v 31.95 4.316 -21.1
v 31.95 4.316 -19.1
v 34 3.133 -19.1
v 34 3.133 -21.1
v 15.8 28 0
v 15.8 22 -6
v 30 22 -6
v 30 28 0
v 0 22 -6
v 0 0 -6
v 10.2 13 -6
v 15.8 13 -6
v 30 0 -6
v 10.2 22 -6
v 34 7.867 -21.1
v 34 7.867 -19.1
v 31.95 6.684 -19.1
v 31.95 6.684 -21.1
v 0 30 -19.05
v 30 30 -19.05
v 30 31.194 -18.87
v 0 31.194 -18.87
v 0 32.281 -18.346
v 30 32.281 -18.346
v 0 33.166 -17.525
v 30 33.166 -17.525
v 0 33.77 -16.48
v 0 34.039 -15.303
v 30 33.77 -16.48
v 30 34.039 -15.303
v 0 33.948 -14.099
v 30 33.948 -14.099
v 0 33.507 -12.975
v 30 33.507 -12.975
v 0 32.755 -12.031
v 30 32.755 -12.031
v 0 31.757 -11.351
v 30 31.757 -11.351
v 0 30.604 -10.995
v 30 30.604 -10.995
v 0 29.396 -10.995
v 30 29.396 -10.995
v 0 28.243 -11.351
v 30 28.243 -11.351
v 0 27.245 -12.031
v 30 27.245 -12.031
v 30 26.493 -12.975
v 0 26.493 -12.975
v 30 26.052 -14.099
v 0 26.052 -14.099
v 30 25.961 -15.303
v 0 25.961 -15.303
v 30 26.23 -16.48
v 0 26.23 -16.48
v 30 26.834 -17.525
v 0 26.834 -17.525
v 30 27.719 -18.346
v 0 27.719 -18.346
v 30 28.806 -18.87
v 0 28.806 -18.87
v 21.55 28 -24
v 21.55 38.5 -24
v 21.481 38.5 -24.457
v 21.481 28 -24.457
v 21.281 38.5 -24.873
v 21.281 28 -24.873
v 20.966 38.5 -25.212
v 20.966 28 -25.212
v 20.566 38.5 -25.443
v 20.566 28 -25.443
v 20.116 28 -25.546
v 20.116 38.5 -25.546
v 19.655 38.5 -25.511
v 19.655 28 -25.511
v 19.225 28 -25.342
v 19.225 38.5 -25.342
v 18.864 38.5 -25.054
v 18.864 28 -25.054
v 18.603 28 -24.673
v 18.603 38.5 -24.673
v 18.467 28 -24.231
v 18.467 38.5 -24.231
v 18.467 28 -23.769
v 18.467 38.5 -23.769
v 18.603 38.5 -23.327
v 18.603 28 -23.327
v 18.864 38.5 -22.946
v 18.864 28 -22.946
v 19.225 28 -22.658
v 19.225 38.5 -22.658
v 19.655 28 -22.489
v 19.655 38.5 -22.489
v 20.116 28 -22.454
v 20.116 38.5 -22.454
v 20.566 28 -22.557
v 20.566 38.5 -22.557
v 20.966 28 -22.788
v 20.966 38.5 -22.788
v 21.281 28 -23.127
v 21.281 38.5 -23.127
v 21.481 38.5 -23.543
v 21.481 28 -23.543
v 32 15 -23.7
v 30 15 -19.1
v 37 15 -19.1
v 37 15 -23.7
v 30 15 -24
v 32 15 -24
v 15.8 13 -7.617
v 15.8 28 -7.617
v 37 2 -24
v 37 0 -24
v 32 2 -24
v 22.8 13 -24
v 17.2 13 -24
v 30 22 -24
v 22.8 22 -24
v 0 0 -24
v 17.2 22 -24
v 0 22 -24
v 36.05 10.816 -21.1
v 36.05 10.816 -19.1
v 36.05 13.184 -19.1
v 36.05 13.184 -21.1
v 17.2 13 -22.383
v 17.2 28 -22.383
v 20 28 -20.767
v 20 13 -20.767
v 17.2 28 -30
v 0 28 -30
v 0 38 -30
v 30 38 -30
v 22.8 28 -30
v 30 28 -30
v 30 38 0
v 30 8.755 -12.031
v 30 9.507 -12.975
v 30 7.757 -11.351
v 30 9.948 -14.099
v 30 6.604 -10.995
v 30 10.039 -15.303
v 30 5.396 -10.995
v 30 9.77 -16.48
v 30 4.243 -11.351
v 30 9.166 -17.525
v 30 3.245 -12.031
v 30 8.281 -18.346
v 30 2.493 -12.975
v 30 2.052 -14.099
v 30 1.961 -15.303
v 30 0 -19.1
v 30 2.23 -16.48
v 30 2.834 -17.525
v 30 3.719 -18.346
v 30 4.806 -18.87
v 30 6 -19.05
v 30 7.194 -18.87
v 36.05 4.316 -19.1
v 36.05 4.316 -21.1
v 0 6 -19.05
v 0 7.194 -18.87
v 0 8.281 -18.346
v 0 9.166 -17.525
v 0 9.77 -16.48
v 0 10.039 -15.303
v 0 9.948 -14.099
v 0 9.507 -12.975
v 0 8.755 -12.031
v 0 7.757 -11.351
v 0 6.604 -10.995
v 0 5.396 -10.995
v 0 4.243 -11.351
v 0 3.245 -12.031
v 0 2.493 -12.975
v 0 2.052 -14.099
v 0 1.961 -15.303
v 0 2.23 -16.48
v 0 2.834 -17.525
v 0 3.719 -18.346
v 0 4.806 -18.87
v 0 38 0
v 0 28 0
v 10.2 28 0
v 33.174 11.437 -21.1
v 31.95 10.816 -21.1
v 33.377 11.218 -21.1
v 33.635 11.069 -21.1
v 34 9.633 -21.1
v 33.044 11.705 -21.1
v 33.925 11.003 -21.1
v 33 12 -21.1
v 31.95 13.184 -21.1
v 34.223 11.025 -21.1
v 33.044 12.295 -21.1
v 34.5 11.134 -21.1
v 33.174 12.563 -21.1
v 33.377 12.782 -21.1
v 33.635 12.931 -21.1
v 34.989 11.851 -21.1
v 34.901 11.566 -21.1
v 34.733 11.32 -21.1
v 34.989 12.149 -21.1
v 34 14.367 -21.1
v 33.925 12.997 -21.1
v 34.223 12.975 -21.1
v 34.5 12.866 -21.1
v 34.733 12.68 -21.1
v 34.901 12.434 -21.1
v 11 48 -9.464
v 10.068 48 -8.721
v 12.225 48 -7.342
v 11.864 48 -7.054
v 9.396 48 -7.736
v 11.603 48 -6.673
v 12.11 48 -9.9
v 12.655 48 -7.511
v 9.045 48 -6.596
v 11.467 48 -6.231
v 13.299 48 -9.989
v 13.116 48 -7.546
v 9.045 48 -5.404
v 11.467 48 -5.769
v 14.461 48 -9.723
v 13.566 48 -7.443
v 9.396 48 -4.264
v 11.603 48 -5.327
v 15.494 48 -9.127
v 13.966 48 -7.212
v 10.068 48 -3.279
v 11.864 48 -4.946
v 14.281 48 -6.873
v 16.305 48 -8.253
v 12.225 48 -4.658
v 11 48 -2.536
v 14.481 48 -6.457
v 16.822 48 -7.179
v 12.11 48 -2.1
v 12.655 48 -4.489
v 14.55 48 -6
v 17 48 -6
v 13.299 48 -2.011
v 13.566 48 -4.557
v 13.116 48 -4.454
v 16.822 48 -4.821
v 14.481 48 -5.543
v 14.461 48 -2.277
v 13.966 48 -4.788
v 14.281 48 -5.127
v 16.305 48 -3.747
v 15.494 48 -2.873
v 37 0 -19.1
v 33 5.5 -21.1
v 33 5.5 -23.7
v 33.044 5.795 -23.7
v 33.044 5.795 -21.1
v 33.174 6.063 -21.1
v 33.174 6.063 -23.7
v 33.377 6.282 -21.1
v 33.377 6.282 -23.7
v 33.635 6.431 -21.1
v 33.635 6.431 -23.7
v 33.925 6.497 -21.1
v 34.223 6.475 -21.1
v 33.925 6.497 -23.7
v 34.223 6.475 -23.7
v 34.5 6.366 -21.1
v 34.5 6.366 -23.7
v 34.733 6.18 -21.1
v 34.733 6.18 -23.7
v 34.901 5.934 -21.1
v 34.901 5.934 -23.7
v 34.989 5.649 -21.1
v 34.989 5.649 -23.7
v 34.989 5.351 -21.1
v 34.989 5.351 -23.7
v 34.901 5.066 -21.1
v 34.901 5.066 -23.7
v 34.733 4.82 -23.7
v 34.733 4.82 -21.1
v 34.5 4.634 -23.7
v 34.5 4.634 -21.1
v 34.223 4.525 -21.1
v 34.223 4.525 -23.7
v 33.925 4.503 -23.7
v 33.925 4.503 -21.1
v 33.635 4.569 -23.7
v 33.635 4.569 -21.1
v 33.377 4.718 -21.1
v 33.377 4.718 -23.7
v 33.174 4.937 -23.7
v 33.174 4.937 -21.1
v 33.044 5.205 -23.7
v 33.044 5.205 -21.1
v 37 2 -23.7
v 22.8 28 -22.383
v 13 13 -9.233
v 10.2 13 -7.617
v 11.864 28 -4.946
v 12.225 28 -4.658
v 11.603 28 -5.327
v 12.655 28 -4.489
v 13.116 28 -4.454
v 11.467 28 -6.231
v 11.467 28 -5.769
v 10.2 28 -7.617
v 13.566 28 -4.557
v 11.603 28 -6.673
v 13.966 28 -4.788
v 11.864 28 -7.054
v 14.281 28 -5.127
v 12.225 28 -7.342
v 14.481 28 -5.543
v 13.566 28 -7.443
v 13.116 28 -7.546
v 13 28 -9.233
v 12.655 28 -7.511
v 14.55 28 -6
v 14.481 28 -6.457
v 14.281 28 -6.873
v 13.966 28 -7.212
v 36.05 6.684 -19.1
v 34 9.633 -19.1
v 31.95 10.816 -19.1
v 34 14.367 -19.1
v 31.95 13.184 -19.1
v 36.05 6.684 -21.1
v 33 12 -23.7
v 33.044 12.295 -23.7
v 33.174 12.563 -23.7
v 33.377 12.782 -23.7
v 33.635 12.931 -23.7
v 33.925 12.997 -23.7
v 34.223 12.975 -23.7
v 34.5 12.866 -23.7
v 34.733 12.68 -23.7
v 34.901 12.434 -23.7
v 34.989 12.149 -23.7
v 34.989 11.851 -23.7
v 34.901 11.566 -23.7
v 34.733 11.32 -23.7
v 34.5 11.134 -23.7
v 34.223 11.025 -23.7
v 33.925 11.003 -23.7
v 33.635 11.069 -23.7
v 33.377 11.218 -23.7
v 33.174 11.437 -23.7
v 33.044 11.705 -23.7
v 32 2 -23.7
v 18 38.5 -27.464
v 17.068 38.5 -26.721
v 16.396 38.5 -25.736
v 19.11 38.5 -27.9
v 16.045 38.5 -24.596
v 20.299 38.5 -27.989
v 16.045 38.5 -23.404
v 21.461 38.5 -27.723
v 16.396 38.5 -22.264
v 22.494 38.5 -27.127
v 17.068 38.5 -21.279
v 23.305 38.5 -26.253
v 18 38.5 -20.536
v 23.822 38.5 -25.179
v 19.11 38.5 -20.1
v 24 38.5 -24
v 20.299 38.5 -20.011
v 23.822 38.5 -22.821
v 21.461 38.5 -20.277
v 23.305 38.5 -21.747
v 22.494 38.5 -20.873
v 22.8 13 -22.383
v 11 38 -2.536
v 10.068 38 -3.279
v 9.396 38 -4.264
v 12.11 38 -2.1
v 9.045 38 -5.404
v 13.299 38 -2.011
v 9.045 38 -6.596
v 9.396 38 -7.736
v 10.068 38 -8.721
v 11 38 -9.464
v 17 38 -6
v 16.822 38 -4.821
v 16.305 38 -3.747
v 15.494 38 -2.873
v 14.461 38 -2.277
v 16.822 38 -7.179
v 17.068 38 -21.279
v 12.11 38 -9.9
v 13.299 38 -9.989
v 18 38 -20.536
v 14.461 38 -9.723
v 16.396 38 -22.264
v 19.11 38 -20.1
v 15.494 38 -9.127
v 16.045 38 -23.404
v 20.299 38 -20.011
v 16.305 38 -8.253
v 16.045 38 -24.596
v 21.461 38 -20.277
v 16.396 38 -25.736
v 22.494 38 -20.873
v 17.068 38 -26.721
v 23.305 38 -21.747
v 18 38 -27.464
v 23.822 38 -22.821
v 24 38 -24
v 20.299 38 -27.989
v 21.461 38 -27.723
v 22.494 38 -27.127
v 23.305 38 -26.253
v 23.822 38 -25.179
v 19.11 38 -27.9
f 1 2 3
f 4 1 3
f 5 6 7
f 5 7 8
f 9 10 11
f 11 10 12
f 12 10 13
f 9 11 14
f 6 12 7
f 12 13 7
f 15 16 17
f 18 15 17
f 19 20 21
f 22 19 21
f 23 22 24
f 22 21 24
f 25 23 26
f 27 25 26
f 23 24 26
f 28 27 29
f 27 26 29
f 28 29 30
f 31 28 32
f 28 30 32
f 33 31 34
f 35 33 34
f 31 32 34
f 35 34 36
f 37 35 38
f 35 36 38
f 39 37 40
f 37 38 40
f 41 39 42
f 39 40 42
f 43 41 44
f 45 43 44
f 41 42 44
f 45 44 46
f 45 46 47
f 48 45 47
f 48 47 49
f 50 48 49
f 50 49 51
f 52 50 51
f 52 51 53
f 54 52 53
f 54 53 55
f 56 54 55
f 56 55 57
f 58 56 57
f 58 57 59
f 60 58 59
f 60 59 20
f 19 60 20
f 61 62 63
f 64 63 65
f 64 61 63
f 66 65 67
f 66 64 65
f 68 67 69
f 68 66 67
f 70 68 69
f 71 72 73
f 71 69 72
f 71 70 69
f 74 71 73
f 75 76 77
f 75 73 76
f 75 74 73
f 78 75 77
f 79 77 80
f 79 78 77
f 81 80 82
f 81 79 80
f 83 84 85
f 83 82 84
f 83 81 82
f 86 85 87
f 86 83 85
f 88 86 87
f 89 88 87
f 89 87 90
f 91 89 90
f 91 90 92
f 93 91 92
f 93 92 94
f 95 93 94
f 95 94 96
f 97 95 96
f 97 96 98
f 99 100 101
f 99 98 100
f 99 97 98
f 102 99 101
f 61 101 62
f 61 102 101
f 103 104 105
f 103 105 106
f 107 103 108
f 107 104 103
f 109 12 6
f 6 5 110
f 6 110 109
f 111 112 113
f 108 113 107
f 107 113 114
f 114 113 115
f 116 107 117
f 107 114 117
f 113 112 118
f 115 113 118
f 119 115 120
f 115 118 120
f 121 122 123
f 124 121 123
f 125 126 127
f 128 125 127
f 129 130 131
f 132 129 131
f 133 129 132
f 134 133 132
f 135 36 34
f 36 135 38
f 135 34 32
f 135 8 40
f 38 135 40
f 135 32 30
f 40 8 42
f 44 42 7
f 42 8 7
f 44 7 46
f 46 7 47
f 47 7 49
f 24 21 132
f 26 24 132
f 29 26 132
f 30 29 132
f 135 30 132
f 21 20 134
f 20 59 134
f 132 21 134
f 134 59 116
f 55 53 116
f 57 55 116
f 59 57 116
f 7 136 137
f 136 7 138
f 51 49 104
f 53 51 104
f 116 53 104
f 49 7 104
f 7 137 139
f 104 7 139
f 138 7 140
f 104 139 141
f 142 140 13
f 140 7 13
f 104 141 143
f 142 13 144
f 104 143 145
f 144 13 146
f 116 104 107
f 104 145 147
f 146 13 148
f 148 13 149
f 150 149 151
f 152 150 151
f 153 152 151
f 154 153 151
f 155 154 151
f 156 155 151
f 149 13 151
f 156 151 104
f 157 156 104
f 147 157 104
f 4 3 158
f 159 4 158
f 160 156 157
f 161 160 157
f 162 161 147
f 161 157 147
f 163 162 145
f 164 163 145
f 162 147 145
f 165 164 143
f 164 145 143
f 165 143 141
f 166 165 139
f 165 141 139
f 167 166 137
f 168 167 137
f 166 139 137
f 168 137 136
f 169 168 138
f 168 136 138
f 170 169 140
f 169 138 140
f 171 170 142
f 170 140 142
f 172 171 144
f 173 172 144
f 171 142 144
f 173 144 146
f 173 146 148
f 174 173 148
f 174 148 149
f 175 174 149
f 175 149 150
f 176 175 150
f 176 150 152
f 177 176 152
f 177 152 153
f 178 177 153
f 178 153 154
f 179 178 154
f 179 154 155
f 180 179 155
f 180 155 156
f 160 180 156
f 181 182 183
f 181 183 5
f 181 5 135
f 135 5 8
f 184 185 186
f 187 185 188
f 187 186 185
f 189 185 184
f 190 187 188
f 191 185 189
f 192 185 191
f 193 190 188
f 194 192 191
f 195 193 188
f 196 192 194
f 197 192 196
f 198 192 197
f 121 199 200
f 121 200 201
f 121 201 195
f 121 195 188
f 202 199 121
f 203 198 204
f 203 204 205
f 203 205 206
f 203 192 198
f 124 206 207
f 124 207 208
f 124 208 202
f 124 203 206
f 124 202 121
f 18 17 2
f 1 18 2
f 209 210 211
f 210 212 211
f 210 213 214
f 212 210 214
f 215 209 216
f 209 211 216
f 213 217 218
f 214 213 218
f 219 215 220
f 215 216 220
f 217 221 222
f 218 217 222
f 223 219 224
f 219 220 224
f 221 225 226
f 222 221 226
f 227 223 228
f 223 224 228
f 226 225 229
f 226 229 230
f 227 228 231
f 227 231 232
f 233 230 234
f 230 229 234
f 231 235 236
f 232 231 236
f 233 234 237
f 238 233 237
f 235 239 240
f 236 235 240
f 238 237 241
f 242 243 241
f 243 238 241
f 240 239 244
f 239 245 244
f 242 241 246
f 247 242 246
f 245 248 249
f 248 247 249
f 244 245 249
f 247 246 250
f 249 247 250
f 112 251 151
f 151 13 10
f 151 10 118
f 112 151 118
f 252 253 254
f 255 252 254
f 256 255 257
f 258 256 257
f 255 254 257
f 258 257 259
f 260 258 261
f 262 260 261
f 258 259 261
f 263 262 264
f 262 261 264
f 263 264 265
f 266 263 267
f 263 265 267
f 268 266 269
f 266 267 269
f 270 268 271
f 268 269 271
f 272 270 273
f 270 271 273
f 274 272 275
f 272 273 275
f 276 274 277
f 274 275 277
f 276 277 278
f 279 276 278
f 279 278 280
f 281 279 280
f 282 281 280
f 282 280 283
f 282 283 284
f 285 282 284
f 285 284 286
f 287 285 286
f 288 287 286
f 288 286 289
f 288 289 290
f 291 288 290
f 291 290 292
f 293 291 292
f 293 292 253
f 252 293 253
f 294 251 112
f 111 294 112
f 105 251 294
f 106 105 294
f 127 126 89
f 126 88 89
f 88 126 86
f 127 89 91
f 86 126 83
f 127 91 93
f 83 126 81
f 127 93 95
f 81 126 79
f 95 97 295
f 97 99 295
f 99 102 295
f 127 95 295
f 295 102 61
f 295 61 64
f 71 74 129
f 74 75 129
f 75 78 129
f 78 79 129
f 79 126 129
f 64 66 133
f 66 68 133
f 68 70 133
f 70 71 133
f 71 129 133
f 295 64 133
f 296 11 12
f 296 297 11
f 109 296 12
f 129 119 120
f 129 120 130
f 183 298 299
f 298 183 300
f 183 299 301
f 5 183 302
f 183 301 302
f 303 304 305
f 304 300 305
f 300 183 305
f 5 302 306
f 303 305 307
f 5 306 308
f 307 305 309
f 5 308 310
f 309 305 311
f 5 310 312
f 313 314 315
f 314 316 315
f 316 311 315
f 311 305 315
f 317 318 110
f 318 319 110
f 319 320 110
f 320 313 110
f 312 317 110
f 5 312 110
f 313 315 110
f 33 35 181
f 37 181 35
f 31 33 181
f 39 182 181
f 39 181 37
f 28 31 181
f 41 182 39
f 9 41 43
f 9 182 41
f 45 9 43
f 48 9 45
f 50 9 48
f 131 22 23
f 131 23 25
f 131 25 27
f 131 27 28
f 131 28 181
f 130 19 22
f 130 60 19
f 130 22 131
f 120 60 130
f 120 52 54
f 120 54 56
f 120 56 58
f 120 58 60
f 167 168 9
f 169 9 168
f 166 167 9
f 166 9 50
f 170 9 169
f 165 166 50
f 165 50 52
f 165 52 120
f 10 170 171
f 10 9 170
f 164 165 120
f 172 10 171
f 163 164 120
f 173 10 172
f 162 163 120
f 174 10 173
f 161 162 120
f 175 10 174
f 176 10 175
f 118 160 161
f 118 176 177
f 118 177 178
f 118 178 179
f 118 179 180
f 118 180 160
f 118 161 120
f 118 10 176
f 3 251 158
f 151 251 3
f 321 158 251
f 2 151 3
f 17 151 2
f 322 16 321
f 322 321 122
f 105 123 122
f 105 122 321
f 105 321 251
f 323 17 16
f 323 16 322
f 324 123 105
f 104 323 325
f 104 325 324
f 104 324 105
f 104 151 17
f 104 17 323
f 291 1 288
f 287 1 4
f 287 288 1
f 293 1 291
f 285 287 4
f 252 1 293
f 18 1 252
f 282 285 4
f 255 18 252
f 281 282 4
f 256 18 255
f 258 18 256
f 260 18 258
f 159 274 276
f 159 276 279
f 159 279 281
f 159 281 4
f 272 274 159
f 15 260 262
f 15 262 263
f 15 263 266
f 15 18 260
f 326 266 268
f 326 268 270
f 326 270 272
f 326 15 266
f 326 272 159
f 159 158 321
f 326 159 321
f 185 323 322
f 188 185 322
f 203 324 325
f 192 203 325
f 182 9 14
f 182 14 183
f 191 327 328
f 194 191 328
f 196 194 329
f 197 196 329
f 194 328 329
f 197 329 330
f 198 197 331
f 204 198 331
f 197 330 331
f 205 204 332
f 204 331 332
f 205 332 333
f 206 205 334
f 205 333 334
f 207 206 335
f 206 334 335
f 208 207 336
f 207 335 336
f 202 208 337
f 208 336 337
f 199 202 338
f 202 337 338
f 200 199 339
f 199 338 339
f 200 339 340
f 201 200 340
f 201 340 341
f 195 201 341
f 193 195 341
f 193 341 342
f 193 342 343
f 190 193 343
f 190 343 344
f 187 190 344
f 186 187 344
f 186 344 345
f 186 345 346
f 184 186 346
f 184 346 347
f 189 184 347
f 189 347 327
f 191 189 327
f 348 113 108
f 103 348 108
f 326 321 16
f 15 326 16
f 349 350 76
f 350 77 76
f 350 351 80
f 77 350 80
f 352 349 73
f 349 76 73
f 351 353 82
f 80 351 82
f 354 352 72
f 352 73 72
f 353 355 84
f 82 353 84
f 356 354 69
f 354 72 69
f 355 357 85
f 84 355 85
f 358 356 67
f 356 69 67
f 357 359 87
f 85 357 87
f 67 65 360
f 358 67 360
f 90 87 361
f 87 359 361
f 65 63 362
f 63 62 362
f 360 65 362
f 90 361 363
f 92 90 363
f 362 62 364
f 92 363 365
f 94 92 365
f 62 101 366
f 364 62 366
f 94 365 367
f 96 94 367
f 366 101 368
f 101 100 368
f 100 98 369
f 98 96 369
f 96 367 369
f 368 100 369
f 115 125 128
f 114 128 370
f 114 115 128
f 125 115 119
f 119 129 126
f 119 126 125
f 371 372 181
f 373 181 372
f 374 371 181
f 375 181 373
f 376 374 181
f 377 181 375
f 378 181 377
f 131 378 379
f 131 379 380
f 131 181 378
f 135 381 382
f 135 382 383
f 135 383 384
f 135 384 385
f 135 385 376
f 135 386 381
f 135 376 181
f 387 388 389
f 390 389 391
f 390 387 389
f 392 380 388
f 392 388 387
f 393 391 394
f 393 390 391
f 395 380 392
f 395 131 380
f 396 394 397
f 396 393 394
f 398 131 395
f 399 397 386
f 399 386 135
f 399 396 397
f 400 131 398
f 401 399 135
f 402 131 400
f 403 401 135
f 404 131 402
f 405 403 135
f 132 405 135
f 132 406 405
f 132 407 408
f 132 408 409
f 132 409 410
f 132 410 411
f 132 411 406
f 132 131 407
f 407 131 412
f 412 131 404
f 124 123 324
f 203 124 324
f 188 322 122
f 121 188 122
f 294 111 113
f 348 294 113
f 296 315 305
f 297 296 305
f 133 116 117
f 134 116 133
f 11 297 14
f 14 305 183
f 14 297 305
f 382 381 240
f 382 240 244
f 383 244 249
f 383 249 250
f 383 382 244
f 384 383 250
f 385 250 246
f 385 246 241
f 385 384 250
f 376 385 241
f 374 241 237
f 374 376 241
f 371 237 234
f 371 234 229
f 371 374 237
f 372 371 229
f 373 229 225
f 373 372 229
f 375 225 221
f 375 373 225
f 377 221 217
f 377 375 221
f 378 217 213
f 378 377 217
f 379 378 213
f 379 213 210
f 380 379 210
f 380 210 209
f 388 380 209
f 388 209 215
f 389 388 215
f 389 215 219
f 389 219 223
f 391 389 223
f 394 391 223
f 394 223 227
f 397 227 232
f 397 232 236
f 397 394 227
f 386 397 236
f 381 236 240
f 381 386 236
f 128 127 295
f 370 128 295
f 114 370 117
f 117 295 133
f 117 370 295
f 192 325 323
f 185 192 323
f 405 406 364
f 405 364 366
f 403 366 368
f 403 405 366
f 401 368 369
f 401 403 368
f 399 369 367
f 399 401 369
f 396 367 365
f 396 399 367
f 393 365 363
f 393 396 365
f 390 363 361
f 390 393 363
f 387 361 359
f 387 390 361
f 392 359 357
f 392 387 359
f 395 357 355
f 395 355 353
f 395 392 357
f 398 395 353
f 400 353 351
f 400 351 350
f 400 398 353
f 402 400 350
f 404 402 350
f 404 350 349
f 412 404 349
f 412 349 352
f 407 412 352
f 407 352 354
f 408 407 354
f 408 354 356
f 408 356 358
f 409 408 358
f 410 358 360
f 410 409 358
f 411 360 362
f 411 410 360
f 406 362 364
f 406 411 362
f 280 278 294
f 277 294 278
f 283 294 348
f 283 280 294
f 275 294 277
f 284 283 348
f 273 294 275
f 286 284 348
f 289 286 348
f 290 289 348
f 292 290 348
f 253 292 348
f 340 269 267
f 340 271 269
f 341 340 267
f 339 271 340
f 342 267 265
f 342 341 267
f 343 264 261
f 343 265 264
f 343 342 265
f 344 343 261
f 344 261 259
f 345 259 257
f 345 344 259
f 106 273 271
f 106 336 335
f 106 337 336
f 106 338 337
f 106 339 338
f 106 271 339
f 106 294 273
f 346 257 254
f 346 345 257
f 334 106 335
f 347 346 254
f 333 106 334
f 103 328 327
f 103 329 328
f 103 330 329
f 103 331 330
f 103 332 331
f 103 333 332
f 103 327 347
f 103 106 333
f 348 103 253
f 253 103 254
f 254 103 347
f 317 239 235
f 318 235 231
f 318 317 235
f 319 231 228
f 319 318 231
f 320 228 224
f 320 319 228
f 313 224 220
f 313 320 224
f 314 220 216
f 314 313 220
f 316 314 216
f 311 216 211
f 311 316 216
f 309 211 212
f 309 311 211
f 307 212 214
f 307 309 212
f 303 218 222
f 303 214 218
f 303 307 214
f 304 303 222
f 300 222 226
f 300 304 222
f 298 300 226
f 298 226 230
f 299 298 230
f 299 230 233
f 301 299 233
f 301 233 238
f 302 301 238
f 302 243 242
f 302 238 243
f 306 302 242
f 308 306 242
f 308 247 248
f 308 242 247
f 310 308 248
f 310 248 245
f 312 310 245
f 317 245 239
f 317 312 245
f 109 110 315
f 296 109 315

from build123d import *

# Parameters (mm, degrees)
SKETCH_1_W          = 30
SKETCH_1_H          = 30
EXTRUDE_1_DEPTH     = 38
SKETCH_3_R          = 4
EXTRUDE_3_DEPTH     = 0.5
SKETCH_7_R          = 4
EXTRUDE_4_DEPTH     = 10
SKETCH_6_R          = 4.05
CUT_EXTRUDE_3_DEPTH = 31
SKETCH_9_R          = 1.55
CUT_EXTRUDE_4_DEPTH = 21
CUT_EXTRUDE_6_DEPTH = 31
CUT_EXTRUDE_5_DEPTH = 15
SKETCH_12_W         = 4.9
SKETCH_12_H         = 15
EXTRUDE_5_DEPTH     = 7
SKETCH_13_W         = 5
SKETCH_13_H         = 13
CUT_EXTRUDE_7_DEPTH = 0.3
SKETCH_14_R         = 1
CUT_EXTRUDE_8_DEPTH = 24.7
CUT_EXTRUDE_9_DEPTH = 2


with BuildPart() as part:
    # 草图1 → 凸台-拉伸1 (new body)
    with BuildSketch(Plane(origin=(0, 0, 0), x_dir=(1, 0, 0), z_dir=(0, 1, 0))):
        with Locations((15, 15)):
            Rectangle(SKETCH_1_W, SKETCH_1_H)
    extrude(amount=EXTRUDE_1_DEPTH)

    # 草图3 → 凸台-拉伸3 (add)
    with BuildSketch(Plane(origin=(0, 38, -50), x_dir=(1, 0, 0), z_dir=(0, -1, 0))):
        with Locations((20, 26)):
            Circle(SKETCH_3_R)
    extrude(amount=-EXTRUDE_3_DEPTH)

    # 草图7 → 凸台-拉伸4 (add)
    with BuildSketch(Plane.XZ.offset(-38)):
        with Locations((13, -6)):
            Circle(SKETCH_7_R)
    extrude(amount=-EXTRUDE_4_DEPTH)

    # 草图6 → 切除-拉伸3 (cut, through all)
    with BuildSketch(Plane(origin=(30, 0, 0), x_dir=(0, 0, -1), z_dir=(1, 0, 0))):
        with Locations((15, 6)):
            Circle(SKETCH_6_R)
        with Locations((15, 30)):
            Circle(SKETCH_6_R)
    extrude(amount=-CUT_EXTRUDE_3_DEPTH, mode=Mode.SUBTRACT)

    # 草图9 → 切除-拉伸4 (cut, through all)
    with BuildSketch(Plane(origin=(0, 28, 0), x_dir=(1, 0, 0), z_dir=(0, 1, 0))):
        with Locations((13, 6)):
            Circle(SKETCH_9_R)
        with Locations((20, 24)):
            Circle(SKETCH_9_R)
    extrude(amount=CUT_EXTRUDE_4_DEPTH, mode=Mode.SUBTRACT)

    # 草图11 → 切除-拉伸6 (cut, through all)
    with BuildSketch(Plane(origin=(30, 0, 0), x_dir=(0, 0, -1), z_dir=(1, 0, 0))):
        Polygon((6, 0), (6, 22), (0, 28), (0, 0), align=None)
        Polygon((24, 0), (24, 22), (30, 28), (30, 0), align=None)
    extrude(amount=-CUT_EXTRUDE_6_DEPTH, mode=Mode.SUBTRACT)

    # 草图10 → 切除-拉伸5 (cut)
    with BuildSketch(Plane(origin=(0, 28, 0), x_dir=(1, 0, 0), z_dir=(0, 1, 0))):
        Polygon((15.8, 0), (15.8, 7.616580754), (13, 9.233161507), (10.2, 7.616580754), (10.2, 0), align=None)
        Polygon((20, 20.766838493), (22.8, 22.383419246), (22.8, 30), (17.2, 30), (17.2, 22.383419246), align=None)
    extrude(amount=-CUT_EXTRUDE_5_DEPTH, mode=Mode.SUBTRACT)

    # 草图12 → 凸台-拉伸5 (add)
    with BuildSketch(Plane(origin=(30, 0, 0), x_dir=(0, 0, -1), z_dir=(1, 0, 0))):
        with Locations((21.55, 7.5)):
            Rectangle(SKETCH_12_W, SKETCH_12_H)
    extrude(amount=EXTRUDE_5_DEPTH)

    # 草图13 → 切除-拉伸7 (cut)
    with BuildSketch(Plane(origin=(0, 0, -24), x_dir=(-1, 0, 0), z_dir=(0, 0, -1))):
        with Locations((-34.5, 8.5)):
            Rectangle(SKETCH_13_W, SKETCH_13_H)
    extrude(amount=-CUT_EXTRUDE_7_DEPTH, mode=Mode.SUBTRACT)

    # 草图14 → 切除-拉伸8 (cut, through all)
    with BuildSketch(Plane(origin=(0, 0, -23.7), x_dir=(-1, 0, 0), z_dir=(0, 0, -1))):
        with Locations((-34, 12)):
            Circle(SKETCH_14_R)
        with Locations((-34, 5.5)):
            Circle(SKETCH_14_R)
    extrude(amount=-CUT_EXTRUDE_8_DEPTH, mode=Mode.SUBTRACT)

    # 草图15 → 切除-拉伸9 (cut)
    with BuildSketch(Plane.XY.offset(-19.1)):
        Polygon((36.05, 10.816431948), (36.05, 13.183568052), (34, 14.367136104), (31.95, 13.183568052), (31.95, 10.816431948), (34, 9.632863896), align=None)
        Polygon((34, 3.132863896), (36.05, 4.316431948), (36.05, 6.683568052), (34, 7.867136104), (31.95, 6.683568052), (31.95, 4.316431948), align=None)
    extrude(amount=-CUT_EXTRUDE_9_DEPTH, mode=Mode.SUBTRACT)


solid = part.part
